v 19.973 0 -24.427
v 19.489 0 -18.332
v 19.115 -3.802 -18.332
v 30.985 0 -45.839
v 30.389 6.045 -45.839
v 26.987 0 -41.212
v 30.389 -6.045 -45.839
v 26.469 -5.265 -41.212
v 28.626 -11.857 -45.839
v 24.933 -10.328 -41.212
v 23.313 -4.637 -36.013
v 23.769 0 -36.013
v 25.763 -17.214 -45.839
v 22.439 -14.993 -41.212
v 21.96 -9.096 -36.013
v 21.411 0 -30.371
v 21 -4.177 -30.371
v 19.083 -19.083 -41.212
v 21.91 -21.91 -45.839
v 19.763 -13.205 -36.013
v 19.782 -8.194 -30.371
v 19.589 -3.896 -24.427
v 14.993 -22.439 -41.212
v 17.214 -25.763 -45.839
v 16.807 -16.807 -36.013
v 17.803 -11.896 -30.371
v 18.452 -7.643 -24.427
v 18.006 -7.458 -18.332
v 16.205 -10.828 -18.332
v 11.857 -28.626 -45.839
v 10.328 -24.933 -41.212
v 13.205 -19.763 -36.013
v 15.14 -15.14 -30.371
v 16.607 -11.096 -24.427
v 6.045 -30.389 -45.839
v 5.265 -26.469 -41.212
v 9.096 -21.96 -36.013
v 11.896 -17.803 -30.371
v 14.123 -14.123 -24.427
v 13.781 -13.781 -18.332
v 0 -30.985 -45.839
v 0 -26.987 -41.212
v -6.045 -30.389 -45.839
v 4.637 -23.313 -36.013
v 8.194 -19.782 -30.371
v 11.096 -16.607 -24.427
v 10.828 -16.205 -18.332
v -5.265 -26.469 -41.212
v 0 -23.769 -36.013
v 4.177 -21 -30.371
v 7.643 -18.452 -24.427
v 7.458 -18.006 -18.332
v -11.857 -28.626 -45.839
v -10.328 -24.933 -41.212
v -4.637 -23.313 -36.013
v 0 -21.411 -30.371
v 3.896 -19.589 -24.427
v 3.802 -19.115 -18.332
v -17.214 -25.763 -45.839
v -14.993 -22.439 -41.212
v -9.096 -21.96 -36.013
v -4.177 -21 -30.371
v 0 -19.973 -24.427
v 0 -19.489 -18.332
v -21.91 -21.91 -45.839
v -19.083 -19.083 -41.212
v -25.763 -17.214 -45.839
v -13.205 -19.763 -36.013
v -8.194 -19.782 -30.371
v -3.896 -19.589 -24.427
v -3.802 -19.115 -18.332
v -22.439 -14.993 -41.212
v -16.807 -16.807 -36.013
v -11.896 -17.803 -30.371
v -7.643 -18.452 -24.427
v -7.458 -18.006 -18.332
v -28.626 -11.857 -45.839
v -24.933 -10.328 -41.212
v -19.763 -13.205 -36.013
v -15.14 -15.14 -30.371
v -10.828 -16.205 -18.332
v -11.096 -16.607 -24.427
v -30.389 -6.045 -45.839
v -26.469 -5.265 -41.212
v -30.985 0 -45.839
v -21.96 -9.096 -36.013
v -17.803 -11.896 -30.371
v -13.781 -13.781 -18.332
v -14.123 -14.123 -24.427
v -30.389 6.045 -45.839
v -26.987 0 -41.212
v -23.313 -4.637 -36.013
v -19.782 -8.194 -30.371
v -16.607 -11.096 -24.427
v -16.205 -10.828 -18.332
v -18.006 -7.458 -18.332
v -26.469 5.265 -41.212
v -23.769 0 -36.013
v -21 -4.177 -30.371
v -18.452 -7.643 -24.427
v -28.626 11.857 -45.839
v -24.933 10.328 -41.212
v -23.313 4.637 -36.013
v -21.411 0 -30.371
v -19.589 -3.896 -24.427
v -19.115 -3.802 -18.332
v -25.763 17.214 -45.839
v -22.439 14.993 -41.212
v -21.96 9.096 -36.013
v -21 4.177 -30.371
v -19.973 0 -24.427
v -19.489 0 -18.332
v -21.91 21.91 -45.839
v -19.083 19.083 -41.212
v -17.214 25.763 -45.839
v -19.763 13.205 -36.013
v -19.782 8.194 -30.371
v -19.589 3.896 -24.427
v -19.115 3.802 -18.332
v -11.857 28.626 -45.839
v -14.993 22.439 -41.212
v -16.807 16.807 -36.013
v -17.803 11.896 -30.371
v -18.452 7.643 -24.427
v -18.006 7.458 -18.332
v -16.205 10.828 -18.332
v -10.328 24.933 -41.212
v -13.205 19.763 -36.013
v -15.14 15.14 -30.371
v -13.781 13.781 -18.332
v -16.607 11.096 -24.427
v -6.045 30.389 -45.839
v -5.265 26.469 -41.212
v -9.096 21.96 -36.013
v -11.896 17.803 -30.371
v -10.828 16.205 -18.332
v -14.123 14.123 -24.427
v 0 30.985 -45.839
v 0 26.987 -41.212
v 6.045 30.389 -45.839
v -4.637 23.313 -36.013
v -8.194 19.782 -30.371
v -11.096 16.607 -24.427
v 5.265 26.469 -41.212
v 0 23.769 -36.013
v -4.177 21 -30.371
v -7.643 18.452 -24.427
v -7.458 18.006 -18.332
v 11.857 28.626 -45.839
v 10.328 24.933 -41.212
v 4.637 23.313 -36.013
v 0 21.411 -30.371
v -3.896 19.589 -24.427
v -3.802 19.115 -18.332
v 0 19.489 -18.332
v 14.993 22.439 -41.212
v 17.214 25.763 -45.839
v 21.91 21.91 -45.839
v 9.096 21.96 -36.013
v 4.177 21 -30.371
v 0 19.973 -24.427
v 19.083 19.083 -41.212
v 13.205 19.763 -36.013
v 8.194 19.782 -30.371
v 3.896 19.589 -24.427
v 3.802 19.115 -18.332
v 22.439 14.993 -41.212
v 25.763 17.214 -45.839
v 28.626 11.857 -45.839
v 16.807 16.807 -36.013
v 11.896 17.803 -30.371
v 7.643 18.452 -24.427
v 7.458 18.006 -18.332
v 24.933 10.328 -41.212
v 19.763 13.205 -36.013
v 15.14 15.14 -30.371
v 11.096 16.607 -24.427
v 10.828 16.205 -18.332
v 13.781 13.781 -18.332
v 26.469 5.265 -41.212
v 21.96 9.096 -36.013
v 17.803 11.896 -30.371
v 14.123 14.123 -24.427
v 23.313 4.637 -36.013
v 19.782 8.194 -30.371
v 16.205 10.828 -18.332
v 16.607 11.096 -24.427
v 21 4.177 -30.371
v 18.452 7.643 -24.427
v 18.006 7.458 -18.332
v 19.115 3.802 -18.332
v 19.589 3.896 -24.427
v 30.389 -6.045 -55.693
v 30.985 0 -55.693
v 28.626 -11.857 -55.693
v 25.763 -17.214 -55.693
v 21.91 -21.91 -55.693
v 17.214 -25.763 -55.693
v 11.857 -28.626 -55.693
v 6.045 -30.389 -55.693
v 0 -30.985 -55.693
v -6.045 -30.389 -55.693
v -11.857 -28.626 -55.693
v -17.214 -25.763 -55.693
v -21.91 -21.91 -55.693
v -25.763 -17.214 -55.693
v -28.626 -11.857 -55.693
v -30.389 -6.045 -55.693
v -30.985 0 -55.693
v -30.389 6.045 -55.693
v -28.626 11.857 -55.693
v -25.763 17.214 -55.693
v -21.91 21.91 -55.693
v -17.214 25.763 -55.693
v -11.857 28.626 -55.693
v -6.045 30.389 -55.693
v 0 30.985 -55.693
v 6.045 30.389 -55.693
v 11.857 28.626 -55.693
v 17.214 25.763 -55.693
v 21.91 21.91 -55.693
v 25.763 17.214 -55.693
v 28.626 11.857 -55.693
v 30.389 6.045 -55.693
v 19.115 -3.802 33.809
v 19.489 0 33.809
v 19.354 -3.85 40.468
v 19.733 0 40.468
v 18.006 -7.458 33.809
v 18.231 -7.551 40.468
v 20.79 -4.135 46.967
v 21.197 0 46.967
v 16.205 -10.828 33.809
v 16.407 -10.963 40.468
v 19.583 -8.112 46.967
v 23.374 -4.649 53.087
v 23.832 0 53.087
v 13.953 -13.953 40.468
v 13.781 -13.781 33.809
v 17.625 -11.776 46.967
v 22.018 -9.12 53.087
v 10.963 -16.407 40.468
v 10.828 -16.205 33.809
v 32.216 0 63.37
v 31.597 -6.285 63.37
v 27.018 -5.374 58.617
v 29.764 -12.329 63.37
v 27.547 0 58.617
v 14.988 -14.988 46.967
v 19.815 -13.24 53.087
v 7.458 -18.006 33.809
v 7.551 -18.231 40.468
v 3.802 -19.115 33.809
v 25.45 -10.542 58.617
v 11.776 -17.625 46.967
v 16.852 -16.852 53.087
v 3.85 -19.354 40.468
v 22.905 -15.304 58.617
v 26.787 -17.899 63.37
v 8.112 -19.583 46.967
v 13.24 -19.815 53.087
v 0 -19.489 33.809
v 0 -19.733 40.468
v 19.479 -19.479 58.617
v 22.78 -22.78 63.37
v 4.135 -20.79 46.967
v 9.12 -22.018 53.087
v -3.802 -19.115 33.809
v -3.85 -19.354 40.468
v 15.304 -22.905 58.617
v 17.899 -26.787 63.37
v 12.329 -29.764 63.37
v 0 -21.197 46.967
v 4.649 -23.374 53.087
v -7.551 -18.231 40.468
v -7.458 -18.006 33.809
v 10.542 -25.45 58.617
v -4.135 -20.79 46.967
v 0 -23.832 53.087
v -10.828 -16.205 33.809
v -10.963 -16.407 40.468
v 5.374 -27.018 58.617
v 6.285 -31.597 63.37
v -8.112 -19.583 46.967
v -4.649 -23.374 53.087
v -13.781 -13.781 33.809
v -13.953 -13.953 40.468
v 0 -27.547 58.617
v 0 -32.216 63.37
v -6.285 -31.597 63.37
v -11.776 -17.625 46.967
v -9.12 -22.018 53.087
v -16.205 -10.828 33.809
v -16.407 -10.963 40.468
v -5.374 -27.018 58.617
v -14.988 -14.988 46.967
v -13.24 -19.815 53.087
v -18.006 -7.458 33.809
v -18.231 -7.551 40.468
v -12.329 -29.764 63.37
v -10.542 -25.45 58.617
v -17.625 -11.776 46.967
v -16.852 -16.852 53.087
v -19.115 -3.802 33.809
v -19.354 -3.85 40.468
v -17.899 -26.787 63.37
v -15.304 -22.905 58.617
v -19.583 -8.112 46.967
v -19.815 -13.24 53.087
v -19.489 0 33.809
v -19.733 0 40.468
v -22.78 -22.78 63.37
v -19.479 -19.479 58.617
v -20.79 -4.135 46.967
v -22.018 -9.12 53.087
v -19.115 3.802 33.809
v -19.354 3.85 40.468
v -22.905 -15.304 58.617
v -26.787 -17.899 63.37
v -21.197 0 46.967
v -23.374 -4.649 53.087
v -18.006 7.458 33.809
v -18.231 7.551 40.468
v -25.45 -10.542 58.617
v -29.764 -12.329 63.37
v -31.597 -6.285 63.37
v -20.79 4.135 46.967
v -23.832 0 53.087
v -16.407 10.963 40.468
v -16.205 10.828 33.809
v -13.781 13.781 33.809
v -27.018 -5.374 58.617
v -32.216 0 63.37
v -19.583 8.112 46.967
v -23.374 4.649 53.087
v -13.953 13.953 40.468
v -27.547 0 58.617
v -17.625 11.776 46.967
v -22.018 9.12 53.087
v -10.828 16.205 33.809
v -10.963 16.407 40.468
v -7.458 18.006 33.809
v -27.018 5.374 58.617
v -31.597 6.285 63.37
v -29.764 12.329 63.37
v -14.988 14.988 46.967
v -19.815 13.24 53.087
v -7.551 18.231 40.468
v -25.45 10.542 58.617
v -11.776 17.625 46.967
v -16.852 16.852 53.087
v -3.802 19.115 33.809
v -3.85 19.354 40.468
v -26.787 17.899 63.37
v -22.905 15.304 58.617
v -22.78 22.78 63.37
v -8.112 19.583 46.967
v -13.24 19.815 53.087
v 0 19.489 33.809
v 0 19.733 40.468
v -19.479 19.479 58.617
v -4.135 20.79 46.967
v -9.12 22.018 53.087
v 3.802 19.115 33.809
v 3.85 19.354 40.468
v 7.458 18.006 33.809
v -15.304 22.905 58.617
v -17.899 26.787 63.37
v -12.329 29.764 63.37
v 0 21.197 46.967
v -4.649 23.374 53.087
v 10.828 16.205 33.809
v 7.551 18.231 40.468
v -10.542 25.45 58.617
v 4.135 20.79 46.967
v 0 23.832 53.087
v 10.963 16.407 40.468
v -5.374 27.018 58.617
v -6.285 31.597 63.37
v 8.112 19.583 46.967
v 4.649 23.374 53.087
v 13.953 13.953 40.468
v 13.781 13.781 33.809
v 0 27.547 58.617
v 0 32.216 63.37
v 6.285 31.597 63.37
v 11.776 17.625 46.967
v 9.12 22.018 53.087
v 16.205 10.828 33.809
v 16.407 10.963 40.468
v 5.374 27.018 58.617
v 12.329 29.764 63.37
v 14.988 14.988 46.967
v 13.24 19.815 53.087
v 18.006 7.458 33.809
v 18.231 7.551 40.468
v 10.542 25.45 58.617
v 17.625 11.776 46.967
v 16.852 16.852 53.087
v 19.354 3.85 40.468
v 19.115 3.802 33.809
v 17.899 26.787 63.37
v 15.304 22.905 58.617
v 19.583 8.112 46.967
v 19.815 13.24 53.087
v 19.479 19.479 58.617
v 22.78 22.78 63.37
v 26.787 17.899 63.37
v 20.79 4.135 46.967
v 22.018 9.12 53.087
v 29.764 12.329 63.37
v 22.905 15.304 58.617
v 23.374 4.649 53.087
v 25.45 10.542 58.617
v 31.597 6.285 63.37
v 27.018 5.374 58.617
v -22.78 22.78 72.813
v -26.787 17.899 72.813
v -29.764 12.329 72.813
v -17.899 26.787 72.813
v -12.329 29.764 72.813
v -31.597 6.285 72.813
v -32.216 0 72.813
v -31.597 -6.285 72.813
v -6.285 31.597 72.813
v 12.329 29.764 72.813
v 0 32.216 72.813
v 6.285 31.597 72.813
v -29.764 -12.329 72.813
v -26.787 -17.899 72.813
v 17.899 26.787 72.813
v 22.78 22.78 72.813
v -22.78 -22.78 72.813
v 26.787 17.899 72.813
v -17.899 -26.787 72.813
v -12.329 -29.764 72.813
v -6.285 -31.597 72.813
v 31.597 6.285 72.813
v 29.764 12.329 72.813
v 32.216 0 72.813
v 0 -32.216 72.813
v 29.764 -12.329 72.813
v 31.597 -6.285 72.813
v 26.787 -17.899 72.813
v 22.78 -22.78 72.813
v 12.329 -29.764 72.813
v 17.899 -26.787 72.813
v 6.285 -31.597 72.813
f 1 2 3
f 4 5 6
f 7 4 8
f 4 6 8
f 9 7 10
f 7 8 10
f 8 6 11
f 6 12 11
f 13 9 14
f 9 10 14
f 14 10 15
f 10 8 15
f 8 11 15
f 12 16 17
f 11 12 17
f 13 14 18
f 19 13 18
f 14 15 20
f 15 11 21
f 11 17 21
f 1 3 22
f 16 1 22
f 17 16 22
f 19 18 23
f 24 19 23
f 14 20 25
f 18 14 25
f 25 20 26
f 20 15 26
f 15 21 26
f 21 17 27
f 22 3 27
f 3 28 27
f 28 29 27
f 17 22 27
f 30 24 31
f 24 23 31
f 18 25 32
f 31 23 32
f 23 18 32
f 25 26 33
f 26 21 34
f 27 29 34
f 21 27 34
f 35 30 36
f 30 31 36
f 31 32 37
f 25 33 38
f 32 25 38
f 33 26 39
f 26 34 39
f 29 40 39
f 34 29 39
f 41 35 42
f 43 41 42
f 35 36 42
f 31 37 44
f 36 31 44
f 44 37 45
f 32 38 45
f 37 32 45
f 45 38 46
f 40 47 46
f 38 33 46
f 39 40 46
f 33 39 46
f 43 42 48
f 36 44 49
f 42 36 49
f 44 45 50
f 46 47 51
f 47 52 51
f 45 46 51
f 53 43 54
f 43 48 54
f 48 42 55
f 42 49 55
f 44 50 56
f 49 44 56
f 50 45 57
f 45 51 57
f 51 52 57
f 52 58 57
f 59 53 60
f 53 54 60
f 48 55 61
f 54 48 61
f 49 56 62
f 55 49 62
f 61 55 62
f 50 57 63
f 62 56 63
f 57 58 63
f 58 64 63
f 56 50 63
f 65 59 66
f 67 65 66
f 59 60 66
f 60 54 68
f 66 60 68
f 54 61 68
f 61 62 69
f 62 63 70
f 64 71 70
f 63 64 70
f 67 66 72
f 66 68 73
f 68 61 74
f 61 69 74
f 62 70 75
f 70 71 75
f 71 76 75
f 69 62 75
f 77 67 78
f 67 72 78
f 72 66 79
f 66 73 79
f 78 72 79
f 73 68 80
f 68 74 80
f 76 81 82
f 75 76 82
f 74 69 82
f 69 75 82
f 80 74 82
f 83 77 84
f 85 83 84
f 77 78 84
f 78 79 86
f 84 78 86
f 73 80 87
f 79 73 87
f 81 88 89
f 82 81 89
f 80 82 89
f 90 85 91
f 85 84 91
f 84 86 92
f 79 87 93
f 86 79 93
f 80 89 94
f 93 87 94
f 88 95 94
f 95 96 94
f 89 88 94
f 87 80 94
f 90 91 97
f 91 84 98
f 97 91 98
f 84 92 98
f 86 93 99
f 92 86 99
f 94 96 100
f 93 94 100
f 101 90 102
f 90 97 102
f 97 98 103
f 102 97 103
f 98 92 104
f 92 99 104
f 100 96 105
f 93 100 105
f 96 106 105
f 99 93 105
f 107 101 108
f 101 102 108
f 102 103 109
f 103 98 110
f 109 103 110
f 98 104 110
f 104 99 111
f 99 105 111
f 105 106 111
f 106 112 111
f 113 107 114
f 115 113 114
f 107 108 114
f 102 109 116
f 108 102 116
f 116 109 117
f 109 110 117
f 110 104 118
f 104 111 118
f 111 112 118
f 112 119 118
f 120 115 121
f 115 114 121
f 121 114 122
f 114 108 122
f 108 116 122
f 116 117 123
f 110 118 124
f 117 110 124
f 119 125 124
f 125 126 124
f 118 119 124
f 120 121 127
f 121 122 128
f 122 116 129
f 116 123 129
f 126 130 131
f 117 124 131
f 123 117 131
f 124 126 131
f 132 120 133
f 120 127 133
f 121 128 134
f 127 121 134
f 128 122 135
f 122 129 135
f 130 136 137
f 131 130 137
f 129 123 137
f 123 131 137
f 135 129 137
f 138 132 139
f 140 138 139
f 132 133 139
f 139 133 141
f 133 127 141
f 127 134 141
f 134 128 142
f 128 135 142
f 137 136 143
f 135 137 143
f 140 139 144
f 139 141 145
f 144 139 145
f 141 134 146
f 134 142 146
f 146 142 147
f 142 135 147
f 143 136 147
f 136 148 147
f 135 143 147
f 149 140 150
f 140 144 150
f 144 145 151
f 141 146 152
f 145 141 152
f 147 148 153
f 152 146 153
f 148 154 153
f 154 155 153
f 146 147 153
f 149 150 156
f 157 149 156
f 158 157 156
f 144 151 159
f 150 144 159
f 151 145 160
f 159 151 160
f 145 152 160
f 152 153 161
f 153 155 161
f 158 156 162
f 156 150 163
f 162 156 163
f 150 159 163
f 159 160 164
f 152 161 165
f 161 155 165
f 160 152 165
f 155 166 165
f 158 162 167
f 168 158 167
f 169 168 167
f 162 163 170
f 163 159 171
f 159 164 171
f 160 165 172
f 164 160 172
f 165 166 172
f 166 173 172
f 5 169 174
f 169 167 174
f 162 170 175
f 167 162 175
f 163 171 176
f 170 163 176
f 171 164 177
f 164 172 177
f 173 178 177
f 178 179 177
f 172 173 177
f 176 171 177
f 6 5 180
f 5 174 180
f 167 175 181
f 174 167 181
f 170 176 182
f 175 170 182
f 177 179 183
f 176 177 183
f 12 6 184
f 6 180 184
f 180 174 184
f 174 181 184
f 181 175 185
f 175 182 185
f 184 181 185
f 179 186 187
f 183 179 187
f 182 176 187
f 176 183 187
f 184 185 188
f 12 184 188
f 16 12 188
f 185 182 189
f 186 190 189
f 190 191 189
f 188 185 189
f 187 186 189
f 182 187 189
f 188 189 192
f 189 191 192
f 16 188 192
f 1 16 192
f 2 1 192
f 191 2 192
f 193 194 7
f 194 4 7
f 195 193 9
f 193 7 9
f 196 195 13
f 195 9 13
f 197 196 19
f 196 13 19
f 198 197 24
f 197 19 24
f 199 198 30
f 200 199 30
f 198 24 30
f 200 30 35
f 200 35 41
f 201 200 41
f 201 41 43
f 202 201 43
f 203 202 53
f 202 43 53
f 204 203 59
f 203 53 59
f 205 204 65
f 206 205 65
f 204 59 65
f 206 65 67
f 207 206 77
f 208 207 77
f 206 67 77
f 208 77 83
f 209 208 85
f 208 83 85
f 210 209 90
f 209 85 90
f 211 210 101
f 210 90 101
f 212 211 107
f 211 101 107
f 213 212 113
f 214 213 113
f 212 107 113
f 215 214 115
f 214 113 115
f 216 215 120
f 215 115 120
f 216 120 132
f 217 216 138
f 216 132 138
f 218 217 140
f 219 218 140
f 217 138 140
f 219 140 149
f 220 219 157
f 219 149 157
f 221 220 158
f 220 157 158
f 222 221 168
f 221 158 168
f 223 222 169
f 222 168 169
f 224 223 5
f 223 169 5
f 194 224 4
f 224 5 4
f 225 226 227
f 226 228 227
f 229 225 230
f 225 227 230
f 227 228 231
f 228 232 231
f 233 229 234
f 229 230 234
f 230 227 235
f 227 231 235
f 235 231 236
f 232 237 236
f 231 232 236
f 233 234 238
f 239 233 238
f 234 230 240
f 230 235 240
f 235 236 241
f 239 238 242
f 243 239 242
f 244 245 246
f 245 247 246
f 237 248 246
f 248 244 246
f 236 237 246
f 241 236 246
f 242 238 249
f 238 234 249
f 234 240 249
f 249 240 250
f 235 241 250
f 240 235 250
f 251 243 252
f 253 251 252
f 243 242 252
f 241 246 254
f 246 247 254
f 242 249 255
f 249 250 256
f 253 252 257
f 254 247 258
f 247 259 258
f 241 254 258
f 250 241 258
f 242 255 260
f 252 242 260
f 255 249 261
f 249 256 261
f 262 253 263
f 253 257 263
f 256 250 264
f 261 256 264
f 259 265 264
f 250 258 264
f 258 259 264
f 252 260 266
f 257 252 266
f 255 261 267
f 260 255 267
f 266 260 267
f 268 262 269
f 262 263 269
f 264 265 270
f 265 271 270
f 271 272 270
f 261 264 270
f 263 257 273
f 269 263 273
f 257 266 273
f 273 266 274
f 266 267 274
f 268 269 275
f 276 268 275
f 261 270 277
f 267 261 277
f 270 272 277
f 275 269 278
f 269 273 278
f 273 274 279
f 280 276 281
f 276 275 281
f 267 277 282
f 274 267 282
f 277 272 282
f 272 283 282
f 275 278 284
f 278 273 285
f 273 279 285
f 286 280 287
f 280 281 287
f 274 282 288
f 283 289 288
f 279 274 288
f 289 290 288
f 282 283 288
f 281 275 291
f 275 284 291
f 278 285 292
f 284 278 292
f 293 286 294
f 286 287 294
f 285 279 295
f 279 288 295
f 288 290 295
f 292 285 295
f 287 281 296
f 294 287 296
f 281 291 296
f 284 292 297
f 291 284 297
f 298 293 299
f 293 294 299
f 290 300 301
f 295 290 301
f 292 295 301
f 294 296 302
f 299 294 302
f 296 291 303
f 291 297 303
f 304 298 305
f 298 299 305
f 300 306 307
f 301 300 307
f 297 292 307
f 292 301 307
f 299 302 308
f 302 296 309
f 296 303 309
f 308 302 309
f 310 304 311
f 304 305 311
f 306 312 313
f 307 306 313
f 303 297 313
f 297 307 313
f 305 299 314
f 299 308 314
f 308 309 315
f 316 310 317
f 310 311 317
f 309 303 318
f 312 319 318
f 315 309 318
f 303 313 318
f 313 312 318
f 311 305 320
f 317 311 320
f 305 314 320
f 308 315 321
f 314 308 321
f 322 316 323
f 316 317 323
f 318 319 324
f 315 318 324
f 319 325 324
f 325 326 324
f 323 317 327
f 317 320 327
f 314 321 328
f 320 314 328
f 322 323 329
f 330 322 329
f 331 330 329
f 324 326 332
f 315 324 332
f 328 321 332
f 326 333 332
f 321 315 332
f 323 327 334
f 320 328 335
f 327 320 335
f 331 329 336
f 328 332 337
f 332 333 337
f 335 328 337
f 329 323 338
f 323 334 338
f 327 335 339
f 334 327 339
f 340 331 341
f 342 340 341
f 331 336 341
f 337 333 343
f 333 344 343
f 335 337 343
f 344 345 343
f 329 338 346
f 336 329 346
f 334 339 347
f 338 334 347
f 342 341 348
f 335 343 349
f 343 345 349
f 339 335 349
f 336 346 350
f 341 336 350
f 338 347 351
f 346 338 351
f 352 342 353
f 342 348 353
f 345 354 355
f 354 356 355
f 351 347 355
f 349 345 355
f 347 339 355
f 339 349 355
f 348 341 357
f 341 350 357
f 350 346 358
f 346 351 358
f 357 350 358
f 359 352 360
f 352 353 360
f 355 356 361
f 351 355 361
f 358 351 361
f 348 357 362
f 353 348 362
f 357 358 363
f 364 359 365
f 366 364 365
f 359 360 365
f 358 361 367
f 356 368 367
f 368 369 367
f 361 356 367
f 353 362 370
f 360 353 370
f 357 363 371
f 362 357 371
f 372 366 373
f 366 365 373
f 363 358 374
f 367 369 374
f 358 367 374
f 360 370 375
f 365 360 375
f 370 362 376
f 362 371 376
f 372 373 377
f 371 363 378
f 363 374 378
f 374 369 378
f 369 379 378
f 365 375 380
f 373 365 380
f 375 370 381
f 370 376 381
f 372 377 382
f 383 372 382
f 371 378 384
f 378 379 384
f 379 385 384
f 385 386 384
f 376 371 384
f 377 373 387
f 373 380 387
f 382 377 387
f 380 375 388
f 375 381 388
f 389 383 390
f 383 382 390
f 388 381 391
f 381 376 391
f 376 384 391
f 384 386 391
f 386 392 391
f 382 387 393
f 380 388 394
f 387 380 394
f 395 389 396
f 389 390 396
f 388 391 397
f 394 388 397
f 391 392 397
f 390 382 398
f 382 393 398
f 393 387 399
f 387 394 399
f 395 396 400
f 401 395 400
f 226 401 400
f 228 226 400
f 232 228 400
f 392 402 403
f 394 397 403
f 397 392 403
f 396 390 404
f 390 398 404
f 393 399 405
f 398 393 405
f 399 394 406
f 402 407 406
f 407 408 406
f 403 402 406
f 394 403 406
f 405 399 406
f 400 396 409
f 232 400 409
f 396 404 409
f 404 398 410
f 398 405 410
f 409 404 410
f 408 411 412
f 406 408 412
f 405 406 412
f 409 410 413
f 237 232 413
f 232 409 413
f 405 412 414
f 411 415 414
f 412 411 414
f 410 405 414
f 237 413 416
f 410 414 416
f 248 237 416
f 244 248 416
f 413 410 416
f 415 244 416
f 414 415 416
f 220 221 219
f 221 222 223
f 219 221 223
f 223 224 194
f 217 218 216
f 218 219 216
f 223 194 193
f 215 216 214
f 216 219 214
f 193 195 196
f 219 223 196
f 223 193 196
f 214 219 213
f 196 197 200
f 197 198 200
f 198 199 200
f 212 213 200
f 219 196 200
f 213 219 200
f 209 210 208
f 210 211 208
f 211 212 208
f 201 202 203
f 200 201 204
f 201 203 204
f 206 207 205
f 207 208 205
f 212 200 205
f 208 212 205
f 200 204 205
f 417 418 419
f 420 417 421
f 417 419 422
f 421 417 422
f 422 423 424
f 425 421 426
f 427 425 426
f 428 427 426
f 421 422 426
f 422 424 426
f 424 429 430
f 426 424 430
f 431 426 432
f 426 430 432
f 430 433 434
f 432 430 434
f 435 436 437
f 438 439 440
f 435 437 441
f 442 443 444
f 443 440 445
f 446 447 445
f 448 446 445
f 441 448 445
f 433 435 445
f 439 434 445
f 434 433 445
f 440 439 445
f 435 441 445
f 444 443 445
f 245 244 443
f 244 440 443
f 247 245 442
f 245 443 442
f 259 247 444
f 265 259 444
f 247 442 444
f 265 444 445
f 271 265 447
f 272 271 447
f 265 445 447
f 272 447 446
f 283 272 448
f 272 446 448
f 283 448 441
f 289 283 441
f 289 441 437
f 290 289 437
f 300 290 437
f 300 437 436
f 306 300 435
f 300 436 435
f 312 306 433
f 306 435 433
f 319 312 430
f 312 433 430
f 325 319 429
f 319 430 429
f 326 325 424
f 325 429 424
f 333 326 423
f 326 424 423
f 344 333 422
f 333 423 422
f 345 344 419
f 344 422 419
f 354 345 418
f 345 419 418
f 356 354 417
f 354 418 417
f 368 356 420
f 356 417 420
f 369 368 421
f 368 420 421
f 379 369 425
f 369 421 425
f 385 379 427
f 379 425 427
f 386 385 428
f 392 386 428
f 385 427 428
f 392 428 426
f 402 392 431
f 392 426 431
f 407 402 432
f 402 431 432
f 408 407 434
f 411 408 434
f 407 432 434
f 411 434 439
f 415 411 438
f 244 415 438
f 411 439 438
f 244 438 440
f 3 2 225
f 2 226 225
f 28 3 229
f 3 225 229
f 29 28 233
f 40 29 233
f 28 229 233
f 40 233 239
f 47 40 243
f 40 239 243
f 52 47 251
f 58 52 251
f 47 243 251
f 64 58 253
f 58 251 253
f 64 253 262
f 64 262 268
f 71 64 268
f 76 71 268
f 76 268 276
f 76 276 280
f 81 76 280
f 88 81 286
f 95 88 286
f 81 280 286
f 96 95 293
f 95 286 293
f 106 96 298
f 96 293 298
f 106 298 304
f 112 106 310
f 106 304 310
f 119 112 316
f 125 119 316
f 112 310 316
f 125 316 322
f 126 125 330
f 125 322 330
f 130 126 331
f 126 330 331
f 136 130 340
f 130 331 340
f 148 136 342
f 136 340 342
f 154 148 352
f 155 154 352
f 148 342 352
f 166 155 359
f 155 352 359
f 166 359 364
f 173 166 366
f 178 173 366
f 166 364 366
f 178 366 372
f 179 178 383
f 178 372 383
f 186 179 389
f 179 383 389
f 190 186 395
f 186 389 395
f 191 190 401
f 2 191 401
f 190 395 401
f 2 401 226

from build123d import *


with BuildPart() as f1:
    # F0 (on Front) → F1 (revolve)
    with BuildSketch(Plane.XZ):
        with BuildLine():
            Line((32.216486, 72.812662), (0, 72.812662))
            Line((0, 72.812662), (0, -55.692833))
            Line((0, -55.692833), (30.984804, -55.692833))
            Line((30.984804, -55.692833), (30.984804, -45.839377))
            ThreePointArc((30.984804, -45.839377), (22.47862, -33.23833), (19.489104, -18.331811))
            Line((19.489104, -18.331811), (19.489104, 33.809394))
            ThreePointArc((19.489104, 33.809394), (22.372698, 50.087954), (32.216486, 63.369766))
            Line((32.216486, 63.369766), (32.216486, 72.812662))
        make_face()
    revolve(axis=Axis((0, 0, -0.267141), (0, 0, -1)))


solid = f1.part
